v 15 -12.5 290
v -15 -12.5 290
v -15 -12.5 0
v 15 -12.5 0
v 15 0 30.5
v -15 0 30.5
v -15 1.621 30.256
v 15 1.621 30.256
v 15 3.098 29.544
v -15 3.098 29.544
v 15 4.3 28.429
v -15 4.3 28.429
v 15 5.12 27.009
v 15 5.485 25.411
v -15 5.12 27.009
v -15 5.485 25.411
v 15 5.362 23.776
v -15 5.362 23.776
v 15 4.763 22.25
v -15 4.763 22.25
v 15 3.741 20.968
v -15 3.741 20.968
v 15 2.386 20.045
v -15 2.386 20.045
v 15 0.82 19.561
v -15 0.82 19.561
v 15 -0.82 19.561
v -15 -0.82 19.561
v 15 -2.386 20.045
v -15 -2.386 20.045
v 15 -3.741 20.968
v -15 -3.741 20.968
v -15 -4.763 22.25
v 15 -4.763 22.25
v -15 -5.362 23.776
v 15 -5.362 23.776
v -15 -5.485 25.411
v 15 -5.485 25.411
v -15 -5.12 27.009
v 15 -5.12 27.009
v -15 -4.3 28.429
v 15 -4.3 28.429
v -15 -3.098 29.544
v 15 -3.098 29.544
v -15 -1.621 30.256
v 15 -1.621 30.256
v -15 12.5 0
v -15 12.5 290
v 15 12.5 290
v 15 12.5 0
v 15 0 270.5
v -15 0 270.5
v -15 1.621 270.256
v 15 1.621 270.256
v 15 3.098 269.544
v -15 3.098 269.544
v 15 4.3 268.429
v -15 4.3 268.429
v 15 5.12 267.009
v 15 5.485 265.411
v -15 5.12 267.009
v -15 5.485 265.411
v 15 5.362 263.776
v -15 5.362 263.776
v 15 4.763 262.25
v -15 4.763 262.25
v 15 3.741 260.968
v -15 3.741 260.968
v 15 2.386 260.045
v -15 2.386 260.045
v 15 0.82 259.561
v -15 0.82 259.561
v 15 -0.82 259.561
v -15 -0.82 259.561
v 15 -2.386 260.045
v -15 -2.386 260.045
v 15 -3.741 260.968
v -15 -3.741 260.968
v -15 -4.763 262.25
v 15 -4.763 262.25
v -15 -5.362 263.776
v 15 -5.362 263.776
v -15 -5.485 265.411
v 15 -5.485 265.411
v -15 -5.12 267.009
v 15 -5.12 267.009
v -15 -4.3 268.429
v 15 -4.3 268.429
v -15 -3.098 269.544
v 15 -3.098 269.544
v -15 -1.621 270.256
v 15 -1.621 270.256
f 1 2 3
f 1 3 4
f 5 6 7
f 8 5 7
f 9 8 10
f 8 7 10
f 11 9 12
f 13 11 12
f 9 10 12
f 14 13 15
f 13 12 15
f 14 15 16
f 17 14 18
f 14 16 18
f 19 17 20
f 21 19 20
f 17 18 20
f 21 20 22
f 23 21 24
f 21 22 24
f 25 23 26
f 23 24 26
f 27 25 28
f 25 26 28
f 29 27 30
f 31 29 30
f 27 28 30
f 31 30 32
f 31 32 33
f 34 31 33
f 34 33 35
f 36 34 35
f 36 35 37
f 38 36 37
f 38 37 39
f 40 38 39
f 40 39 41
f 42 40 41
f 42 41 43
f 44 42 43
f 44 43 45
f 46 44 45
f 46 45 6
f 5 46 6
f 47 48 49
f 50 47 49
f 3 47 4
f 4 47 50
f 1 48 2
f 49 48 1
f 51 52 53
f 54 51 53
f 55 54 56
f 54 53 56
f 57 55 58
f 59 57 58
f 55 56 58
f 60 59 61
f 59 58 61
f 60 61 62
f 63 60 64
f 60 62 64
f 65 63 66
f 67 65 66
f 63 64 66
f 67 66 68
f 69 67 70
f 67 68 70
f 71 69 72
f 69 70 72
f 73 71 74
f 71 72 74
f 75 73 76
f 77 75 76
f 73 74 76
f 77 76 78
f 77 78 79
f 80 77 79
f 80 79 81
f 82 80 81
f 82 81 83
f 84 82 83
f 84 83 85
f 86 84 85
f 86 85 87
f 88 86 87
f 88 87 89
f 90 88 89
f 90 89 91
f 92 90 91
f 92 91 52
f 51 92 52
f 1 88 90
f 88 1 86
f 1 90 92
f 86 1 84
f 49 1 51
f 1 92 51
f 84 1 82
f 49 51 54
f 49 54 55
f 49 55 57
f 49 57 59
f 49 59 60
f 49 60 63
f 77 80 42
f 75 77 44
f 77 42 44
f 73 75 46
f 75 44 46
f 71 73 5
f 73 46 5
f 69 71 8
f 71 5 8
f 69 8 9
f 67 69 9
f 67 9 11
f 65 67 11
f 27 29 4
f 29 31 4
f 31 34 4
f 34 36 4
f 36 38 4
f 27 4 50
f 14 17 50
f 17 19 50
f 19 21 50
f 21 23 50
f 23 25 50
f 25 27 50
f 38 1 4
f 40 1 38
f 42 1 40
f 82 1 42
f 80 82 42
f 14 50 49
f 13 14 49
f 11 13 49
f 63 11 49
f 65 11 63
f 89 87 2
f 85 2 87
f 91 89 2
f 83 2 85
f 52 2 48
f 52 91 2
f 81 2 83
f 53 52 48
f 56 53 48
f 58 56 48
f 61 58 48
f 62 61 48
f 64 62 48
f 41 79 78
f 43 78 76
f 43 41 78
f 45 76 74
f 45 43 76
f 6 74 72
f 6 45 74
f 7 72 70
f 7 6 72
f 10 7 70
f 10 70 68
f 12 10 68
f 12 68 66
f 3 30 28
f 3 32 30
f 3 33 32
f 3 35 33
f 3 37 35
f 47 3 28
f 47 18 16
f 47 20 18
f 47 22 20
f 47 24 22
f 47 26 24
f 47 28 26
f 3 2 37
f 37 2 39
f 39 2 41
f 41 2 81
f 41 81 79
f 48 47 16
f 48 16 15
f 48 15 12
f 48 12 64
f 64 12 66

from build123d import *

# Parameters (mm, degrees)
ESBO_O1_W                = 30
ESBO_O1_H                = 25
RESSALTO_EXTRUS_O2_DEPTH = 290
ESBO_O2_R                = 5.5
CORTE_EXTRUS_O1_DEPTH    = 290


with BuildPart() as part:
    # Esboço1 → Ressalto-extrusão2 (new body)
    with BuildSketch(Plane.XY):
        Rectangle(ESBO_O1_W, ESBO_O1_H)
    extrude(amount=RESSALTO_EXTRUS_O2_DEPTH)

    # Esboço2 → Corte-extrusão1 (cut)
    with BuildSketch(Plane.ZY.offset(15)):
        with Locations((25, 0)):
            Circle(ESBO_O2_R)
        with Locations((265, 0)):
            Circle(ESBO_O2_R)
    extrude(amount=-CORTE_EXTRUS_O1_DEPTH, mode=Mode.SUBTRACT)


solid = part.part
